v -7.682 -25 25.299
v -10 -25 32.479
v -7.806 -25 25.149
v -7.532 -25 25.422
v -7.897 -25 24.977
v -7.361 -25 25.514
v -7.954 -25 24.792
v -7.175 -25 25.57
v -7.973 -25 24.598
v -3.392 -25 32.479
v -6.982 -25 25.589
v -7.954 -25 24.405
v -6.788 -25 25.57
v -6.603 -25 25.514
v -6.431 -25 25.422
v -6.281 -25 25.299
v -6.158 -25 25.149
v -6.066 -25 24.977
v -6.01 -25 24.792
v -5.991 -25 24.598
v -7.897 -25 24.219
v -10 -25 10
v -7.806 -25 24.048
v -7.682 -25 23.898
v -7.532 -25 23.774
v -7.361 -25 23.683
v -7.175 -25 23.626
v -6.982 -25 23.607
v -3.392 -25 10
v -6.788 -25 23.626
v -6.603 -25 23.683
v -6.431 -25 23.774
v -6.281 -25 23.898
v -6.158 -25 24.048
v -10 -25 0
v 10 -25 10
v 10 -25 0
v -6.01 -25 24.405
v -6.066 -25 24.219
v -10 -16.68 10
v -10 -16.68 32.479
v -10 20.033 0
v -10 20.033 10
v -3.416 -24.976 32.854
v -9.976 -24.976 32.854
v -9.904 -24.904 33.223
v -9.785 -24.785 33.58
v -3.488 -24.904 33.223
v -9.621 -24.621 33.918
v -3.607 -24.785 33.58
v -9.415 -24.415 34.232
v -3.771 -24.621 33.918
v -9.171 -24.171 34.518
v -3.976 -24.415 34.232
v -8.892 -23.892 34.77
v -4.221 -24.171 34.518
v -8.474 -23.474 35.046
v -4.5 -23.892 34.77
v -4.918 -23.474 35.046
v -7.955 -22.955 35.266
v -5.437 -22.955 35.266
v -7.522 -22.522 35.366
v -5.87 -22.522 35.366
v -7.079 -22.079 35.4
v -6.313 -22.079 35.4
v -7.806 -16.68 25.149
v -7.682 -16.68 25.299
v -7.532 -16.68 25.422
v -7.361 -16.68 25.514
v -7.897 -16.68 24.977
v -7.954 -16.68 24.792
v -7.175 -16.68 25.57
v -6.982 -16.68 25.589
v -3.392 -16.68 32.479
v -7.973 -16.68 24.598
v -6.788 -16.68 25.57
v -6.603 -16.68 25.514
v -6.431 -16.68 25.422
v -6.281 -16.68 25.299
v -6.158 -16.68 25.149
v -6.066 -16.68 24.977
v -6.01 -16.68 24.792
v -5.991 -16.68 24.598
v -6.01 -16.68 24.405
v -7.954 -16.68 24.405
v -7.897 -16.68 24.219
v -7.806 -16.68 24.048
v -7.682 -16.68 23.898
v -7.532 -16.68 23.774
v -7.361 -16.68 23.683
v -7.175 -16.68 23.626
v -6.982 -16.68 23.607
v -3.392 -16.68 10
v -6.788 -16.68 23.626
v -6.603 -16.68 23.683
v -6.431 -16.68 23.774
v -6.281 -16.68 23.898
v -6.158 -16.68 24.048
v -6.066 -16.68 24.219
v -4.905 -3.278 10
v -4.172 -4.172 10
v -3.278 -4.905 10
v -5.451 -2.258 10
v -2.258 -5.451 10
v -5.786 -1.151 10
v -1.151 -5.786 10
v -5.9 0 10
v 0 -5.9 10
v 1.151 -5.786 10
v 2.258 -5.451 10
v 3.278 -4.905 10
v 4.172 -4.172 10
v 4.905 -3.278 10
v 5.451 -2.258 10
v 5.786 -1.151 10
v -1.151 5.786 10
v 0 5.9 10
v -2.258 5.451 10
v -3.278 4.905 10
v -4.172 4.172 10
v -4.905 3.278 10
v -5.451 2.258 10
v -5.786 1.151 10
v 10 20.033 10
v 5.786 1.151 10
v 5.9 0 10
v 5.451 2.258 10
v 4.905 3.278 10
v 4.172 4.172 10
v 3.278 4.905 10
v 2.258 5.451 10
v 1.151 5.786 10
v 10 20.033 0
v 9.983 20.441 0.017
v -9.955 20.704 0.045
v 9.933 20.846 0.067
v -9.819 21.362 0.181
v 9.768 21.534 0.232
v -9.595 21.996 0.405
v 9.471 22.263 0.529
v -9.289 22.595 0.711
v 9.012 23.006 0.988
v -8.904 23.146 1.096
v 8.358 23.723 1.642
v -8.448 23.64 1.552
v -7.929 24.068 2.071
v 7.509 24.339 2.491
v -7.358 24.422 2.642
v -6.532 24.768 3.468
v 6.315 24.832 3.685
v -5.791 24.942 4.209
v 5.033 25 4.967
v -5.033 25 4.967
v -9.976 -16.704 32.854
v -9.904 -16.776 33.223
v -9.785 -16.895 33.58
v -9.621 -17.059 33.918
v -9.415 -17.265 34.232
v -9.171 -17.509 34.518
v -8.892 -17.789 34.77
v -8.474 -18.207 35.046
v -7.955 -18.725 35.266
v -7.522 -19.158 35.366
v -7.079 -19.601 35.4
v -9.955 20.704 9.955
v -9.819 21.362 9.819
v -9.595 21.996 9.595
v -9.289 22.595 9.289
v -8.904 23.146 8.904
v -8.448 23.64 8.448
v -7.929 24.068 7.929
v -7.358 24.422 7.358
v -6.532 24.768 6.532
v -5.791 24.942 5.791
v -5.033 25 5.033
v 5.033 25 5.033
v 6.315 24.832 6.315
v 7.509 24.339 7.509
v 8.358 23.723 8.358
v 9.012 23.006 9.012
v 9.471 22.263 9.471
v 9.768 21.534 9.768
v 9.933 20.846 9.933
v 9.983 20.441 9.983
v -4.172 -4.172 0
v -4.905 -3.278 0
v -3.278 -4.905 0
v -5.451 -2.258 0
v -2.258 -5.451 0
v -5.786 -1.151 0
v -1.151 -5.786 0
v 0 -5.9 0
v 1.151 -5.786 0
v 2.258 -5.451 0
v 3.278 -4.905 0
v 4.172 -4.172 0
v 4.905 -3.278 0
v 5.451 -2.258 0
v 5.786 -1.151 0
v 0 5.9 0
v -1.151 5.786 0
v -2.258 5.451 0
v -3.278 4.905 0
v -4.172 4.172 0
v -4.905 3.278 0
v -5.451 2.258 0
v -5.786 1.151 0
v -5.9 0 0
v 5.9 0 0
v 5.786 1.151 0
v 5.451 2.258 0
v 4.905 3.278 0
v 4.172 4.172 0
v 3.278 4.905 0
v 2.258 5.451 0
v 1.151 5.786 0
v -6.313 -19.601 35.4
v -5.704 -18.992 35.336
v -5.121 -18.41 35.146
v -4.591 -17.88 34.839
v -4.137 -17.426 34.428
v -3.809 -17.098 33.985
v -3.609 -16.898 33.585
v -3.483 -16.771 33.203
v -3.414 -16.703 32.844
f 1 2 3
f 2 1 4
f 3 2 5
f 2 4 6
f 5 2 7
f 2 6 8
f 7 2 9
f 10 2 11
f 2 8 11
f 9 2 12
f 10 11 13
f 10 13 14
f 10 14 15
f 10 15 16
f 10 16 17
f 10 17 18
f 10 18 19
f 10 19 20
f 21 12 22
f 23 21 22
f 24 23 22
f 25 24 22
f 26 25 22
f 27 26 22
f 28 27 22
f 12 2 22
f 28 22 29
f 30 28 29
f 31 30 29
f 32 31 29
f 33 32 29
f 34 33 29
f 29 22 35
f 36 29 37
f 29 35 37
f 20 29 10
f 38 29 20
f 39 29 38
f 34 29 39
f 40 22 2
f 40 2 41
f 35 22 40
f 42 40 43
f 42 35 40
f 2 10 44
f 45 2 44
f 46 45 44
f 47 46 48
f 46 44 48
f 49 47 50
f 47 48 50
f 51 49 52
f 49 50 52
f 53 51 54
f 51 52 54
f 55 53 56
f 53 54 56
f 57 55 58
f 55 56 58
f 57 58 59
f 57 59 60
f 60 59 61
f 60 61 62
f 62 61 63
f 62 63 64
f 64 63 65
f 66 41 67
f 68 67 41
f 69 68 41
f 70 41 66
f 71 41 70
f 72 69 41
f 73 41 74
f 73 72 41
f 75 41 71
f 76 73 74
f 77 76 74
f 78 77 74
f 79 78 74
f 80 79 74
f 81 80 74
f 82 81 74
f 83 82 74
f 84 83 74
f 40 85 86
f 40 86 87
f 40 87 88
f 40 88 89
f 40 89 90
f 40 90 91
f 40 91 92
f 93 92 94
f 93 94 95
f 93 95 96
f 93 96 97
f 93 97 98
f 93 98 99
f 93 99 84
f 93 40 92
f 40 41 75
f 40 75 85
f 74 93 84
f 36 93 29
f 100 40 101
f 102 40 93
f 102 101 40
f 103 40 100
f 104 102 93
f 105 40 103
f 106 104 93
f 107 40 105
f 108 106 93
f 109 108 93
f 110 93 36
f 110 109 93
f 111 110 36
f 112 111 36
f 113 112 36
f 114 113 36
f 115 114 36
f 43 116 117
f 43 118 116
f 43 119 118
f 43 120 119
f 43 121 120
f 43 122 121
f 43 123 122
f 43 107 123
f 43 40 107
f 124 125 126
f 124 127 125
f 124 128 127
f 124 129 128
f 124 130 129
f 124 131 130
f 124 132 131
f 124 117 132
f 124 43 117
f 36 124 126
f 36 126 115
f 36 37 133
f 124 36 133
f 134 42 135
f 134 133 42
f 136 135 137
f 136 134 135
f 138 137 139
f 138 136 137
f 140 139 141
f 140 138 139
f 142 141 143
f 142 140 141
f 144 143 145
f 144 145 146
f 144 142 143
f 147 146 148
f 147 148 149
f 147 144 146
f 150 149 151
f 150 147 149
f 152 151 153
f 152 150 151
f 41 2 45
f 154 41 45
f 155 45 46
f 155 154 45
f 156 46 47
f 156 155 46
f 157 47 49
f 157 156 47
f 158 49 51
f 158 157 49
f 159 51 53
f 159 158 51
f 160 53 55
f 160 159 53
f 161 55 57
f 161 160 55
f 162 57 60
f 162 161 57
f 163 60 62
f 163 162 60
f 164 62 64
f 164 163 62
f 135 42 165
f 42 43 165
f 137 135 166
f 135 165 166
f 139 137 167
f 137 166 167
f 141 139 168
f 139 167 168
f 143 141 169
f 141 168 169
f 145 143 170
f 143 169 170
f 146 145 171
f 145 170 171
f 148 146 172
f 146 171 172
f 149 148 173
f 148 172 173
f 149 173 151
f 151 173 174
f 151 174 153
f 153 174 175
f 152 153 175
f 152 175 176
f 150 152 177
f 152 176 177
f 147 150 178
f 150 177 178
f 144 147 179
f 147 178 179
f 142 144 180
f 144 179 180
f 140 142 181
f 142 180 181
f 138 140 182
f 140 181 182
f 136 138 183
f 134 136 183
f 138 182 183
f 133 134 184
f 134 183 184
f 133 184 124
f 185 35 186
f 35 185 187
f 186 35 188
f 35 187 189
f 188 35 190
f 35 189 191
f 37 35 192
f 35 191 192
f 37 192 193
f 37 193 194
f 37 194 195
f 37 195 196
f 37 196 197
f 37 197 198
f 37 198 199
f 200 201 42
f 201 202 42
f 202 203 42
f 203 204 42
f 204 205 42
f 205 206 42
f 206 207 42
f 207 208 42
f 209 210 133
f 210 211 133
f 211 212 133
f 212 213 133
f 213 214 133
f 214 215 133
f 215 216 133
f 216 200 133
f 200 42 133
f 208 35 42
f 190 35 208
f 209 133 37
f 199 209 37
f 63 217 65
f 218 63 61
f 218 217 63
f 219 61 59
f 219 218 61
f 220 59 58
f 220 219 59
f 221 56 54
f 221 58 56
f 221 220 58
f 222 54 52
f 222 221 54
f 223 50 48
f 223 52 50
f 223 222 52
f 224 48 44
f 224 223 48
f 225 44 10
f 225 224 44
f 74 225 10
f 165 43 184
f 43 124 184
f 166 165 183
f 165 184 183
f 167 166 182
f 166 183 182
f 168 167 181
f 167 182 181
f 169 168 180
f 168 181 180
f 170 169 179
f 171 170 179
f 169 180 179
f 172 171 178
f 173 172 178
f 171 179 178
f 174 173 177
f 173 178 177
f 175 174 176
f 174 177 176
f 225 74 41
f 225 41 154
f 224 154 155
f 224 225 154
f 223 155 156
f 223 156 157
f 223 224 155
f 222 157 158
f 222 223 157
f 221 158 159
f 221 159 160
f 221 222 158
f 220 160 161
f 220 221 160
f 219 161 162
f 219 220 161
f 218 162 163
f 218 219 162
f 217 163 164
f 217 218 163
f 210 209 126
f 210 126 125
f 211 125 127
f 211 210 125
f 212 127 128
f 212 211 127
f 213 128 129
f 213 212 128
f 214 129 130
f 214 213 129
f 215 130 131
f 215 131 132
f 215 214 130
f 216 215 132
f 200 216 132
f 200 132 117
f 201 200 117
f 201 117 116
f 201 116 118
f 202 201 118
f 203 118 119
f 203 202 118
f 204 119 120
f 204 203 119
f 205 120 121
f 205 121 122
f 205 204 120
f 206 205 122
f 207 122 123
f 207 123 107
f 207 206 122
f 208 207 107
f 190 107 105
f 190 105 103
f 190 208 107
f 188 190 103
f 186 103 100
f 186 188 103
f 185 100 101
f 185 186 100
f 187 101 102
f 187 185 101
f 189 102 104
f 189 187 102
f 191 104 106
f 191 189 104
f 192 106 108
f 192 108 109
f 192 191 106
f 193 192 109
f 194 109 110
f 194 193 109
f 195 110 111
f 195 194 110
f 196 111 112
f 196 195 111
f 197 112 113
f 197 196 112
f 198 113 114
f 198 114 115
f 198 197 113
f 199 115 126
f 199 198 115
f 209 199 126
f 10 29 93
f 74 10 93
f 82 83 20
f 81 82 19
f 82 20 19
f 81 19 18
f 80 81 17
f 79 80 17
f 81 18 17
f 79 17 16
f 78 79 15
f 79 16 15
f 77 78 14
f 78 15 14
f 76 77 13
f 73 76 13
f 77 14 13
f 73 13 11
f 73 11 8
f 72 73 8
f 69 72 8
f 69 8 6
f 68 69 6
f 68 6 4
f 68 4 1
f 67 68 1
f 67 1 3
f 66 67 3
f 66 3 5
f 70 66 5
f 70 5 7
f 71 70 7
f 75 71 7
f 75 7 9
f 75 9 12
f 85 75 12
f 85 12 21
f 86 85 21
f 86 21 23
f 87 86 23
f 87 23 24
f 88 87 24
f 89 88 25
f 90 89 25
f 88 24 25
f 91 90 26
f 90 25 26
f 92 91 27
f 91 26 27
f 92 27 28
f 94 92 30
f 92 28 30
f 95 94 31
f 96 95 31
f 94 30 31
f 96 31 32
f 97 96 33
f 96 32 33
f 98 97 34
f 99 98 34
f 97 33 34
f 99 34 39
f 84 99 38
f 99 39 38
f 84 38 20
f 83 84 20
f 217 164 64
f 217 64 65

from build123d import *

# Parameters (mm, degrees)
F0_W     = 20
F0_H     = 50
F0_R     = 5.8996417904
F1_DEPTH = 10
F2_W     = 6.6084070038
F2_H     = 8.3198506385
F3_DEPTH = 25.4
F4_R     = 2.921
F5_R     = 4.9670029832
F6_R     = 0.9909047391
F7_DEPTH = 9.017


with BuildPart() as f1:
    # F0 (on Top) → F1 (new body)
    with BuildSketch(Plane.XY):
        Rectangle(F0_W, F0_H)
        Circle(F0_R, mode=Mode.SUBTRACT)
    extrude(amount=F1_DEPTH)

    # F2 (on face) → F3 (join)
    with BuildSketch(Plane.XY.offset(10)):
        with Locations((-6.6957964981, -20.8400746807)):
            Rectangle(F2_W, F2_H)
    extrude(amount=F3_DEPTH)

    # F4
    f4_edges = [f1.edges().sort_by_distance(p)[0] for p in [
        (-10, -20.840075, 35.4),
        (-6.695796, -25, 35.4),
        (-3.391593, -20.840075, 35.4),
        (-6.695796, -16.680149, 35.4),
    ]]
    fillet(f4_edges, radius=F4_R)

    # F5
    f5_edges = [f1.edges().sort_by_distance(p)[0] for p in [
        (10, 25, 5),
        (-10, 25, 5),
        (0, 25, 0),
        (0, 25, 10),
    ]]
    fillet(f5_edges, radius=F5_R)

    # F6 (on face) → F7 (cut)
    with BuildSketch(Plane.XZ.offset(25)):
        with Locations((-6.9817616604, 24.5982613415)):
            Circle(F6_R)
    extrude(amount=-F7_DEPTH, mode=Mode.SUBTRACT)


solid = f1.part
